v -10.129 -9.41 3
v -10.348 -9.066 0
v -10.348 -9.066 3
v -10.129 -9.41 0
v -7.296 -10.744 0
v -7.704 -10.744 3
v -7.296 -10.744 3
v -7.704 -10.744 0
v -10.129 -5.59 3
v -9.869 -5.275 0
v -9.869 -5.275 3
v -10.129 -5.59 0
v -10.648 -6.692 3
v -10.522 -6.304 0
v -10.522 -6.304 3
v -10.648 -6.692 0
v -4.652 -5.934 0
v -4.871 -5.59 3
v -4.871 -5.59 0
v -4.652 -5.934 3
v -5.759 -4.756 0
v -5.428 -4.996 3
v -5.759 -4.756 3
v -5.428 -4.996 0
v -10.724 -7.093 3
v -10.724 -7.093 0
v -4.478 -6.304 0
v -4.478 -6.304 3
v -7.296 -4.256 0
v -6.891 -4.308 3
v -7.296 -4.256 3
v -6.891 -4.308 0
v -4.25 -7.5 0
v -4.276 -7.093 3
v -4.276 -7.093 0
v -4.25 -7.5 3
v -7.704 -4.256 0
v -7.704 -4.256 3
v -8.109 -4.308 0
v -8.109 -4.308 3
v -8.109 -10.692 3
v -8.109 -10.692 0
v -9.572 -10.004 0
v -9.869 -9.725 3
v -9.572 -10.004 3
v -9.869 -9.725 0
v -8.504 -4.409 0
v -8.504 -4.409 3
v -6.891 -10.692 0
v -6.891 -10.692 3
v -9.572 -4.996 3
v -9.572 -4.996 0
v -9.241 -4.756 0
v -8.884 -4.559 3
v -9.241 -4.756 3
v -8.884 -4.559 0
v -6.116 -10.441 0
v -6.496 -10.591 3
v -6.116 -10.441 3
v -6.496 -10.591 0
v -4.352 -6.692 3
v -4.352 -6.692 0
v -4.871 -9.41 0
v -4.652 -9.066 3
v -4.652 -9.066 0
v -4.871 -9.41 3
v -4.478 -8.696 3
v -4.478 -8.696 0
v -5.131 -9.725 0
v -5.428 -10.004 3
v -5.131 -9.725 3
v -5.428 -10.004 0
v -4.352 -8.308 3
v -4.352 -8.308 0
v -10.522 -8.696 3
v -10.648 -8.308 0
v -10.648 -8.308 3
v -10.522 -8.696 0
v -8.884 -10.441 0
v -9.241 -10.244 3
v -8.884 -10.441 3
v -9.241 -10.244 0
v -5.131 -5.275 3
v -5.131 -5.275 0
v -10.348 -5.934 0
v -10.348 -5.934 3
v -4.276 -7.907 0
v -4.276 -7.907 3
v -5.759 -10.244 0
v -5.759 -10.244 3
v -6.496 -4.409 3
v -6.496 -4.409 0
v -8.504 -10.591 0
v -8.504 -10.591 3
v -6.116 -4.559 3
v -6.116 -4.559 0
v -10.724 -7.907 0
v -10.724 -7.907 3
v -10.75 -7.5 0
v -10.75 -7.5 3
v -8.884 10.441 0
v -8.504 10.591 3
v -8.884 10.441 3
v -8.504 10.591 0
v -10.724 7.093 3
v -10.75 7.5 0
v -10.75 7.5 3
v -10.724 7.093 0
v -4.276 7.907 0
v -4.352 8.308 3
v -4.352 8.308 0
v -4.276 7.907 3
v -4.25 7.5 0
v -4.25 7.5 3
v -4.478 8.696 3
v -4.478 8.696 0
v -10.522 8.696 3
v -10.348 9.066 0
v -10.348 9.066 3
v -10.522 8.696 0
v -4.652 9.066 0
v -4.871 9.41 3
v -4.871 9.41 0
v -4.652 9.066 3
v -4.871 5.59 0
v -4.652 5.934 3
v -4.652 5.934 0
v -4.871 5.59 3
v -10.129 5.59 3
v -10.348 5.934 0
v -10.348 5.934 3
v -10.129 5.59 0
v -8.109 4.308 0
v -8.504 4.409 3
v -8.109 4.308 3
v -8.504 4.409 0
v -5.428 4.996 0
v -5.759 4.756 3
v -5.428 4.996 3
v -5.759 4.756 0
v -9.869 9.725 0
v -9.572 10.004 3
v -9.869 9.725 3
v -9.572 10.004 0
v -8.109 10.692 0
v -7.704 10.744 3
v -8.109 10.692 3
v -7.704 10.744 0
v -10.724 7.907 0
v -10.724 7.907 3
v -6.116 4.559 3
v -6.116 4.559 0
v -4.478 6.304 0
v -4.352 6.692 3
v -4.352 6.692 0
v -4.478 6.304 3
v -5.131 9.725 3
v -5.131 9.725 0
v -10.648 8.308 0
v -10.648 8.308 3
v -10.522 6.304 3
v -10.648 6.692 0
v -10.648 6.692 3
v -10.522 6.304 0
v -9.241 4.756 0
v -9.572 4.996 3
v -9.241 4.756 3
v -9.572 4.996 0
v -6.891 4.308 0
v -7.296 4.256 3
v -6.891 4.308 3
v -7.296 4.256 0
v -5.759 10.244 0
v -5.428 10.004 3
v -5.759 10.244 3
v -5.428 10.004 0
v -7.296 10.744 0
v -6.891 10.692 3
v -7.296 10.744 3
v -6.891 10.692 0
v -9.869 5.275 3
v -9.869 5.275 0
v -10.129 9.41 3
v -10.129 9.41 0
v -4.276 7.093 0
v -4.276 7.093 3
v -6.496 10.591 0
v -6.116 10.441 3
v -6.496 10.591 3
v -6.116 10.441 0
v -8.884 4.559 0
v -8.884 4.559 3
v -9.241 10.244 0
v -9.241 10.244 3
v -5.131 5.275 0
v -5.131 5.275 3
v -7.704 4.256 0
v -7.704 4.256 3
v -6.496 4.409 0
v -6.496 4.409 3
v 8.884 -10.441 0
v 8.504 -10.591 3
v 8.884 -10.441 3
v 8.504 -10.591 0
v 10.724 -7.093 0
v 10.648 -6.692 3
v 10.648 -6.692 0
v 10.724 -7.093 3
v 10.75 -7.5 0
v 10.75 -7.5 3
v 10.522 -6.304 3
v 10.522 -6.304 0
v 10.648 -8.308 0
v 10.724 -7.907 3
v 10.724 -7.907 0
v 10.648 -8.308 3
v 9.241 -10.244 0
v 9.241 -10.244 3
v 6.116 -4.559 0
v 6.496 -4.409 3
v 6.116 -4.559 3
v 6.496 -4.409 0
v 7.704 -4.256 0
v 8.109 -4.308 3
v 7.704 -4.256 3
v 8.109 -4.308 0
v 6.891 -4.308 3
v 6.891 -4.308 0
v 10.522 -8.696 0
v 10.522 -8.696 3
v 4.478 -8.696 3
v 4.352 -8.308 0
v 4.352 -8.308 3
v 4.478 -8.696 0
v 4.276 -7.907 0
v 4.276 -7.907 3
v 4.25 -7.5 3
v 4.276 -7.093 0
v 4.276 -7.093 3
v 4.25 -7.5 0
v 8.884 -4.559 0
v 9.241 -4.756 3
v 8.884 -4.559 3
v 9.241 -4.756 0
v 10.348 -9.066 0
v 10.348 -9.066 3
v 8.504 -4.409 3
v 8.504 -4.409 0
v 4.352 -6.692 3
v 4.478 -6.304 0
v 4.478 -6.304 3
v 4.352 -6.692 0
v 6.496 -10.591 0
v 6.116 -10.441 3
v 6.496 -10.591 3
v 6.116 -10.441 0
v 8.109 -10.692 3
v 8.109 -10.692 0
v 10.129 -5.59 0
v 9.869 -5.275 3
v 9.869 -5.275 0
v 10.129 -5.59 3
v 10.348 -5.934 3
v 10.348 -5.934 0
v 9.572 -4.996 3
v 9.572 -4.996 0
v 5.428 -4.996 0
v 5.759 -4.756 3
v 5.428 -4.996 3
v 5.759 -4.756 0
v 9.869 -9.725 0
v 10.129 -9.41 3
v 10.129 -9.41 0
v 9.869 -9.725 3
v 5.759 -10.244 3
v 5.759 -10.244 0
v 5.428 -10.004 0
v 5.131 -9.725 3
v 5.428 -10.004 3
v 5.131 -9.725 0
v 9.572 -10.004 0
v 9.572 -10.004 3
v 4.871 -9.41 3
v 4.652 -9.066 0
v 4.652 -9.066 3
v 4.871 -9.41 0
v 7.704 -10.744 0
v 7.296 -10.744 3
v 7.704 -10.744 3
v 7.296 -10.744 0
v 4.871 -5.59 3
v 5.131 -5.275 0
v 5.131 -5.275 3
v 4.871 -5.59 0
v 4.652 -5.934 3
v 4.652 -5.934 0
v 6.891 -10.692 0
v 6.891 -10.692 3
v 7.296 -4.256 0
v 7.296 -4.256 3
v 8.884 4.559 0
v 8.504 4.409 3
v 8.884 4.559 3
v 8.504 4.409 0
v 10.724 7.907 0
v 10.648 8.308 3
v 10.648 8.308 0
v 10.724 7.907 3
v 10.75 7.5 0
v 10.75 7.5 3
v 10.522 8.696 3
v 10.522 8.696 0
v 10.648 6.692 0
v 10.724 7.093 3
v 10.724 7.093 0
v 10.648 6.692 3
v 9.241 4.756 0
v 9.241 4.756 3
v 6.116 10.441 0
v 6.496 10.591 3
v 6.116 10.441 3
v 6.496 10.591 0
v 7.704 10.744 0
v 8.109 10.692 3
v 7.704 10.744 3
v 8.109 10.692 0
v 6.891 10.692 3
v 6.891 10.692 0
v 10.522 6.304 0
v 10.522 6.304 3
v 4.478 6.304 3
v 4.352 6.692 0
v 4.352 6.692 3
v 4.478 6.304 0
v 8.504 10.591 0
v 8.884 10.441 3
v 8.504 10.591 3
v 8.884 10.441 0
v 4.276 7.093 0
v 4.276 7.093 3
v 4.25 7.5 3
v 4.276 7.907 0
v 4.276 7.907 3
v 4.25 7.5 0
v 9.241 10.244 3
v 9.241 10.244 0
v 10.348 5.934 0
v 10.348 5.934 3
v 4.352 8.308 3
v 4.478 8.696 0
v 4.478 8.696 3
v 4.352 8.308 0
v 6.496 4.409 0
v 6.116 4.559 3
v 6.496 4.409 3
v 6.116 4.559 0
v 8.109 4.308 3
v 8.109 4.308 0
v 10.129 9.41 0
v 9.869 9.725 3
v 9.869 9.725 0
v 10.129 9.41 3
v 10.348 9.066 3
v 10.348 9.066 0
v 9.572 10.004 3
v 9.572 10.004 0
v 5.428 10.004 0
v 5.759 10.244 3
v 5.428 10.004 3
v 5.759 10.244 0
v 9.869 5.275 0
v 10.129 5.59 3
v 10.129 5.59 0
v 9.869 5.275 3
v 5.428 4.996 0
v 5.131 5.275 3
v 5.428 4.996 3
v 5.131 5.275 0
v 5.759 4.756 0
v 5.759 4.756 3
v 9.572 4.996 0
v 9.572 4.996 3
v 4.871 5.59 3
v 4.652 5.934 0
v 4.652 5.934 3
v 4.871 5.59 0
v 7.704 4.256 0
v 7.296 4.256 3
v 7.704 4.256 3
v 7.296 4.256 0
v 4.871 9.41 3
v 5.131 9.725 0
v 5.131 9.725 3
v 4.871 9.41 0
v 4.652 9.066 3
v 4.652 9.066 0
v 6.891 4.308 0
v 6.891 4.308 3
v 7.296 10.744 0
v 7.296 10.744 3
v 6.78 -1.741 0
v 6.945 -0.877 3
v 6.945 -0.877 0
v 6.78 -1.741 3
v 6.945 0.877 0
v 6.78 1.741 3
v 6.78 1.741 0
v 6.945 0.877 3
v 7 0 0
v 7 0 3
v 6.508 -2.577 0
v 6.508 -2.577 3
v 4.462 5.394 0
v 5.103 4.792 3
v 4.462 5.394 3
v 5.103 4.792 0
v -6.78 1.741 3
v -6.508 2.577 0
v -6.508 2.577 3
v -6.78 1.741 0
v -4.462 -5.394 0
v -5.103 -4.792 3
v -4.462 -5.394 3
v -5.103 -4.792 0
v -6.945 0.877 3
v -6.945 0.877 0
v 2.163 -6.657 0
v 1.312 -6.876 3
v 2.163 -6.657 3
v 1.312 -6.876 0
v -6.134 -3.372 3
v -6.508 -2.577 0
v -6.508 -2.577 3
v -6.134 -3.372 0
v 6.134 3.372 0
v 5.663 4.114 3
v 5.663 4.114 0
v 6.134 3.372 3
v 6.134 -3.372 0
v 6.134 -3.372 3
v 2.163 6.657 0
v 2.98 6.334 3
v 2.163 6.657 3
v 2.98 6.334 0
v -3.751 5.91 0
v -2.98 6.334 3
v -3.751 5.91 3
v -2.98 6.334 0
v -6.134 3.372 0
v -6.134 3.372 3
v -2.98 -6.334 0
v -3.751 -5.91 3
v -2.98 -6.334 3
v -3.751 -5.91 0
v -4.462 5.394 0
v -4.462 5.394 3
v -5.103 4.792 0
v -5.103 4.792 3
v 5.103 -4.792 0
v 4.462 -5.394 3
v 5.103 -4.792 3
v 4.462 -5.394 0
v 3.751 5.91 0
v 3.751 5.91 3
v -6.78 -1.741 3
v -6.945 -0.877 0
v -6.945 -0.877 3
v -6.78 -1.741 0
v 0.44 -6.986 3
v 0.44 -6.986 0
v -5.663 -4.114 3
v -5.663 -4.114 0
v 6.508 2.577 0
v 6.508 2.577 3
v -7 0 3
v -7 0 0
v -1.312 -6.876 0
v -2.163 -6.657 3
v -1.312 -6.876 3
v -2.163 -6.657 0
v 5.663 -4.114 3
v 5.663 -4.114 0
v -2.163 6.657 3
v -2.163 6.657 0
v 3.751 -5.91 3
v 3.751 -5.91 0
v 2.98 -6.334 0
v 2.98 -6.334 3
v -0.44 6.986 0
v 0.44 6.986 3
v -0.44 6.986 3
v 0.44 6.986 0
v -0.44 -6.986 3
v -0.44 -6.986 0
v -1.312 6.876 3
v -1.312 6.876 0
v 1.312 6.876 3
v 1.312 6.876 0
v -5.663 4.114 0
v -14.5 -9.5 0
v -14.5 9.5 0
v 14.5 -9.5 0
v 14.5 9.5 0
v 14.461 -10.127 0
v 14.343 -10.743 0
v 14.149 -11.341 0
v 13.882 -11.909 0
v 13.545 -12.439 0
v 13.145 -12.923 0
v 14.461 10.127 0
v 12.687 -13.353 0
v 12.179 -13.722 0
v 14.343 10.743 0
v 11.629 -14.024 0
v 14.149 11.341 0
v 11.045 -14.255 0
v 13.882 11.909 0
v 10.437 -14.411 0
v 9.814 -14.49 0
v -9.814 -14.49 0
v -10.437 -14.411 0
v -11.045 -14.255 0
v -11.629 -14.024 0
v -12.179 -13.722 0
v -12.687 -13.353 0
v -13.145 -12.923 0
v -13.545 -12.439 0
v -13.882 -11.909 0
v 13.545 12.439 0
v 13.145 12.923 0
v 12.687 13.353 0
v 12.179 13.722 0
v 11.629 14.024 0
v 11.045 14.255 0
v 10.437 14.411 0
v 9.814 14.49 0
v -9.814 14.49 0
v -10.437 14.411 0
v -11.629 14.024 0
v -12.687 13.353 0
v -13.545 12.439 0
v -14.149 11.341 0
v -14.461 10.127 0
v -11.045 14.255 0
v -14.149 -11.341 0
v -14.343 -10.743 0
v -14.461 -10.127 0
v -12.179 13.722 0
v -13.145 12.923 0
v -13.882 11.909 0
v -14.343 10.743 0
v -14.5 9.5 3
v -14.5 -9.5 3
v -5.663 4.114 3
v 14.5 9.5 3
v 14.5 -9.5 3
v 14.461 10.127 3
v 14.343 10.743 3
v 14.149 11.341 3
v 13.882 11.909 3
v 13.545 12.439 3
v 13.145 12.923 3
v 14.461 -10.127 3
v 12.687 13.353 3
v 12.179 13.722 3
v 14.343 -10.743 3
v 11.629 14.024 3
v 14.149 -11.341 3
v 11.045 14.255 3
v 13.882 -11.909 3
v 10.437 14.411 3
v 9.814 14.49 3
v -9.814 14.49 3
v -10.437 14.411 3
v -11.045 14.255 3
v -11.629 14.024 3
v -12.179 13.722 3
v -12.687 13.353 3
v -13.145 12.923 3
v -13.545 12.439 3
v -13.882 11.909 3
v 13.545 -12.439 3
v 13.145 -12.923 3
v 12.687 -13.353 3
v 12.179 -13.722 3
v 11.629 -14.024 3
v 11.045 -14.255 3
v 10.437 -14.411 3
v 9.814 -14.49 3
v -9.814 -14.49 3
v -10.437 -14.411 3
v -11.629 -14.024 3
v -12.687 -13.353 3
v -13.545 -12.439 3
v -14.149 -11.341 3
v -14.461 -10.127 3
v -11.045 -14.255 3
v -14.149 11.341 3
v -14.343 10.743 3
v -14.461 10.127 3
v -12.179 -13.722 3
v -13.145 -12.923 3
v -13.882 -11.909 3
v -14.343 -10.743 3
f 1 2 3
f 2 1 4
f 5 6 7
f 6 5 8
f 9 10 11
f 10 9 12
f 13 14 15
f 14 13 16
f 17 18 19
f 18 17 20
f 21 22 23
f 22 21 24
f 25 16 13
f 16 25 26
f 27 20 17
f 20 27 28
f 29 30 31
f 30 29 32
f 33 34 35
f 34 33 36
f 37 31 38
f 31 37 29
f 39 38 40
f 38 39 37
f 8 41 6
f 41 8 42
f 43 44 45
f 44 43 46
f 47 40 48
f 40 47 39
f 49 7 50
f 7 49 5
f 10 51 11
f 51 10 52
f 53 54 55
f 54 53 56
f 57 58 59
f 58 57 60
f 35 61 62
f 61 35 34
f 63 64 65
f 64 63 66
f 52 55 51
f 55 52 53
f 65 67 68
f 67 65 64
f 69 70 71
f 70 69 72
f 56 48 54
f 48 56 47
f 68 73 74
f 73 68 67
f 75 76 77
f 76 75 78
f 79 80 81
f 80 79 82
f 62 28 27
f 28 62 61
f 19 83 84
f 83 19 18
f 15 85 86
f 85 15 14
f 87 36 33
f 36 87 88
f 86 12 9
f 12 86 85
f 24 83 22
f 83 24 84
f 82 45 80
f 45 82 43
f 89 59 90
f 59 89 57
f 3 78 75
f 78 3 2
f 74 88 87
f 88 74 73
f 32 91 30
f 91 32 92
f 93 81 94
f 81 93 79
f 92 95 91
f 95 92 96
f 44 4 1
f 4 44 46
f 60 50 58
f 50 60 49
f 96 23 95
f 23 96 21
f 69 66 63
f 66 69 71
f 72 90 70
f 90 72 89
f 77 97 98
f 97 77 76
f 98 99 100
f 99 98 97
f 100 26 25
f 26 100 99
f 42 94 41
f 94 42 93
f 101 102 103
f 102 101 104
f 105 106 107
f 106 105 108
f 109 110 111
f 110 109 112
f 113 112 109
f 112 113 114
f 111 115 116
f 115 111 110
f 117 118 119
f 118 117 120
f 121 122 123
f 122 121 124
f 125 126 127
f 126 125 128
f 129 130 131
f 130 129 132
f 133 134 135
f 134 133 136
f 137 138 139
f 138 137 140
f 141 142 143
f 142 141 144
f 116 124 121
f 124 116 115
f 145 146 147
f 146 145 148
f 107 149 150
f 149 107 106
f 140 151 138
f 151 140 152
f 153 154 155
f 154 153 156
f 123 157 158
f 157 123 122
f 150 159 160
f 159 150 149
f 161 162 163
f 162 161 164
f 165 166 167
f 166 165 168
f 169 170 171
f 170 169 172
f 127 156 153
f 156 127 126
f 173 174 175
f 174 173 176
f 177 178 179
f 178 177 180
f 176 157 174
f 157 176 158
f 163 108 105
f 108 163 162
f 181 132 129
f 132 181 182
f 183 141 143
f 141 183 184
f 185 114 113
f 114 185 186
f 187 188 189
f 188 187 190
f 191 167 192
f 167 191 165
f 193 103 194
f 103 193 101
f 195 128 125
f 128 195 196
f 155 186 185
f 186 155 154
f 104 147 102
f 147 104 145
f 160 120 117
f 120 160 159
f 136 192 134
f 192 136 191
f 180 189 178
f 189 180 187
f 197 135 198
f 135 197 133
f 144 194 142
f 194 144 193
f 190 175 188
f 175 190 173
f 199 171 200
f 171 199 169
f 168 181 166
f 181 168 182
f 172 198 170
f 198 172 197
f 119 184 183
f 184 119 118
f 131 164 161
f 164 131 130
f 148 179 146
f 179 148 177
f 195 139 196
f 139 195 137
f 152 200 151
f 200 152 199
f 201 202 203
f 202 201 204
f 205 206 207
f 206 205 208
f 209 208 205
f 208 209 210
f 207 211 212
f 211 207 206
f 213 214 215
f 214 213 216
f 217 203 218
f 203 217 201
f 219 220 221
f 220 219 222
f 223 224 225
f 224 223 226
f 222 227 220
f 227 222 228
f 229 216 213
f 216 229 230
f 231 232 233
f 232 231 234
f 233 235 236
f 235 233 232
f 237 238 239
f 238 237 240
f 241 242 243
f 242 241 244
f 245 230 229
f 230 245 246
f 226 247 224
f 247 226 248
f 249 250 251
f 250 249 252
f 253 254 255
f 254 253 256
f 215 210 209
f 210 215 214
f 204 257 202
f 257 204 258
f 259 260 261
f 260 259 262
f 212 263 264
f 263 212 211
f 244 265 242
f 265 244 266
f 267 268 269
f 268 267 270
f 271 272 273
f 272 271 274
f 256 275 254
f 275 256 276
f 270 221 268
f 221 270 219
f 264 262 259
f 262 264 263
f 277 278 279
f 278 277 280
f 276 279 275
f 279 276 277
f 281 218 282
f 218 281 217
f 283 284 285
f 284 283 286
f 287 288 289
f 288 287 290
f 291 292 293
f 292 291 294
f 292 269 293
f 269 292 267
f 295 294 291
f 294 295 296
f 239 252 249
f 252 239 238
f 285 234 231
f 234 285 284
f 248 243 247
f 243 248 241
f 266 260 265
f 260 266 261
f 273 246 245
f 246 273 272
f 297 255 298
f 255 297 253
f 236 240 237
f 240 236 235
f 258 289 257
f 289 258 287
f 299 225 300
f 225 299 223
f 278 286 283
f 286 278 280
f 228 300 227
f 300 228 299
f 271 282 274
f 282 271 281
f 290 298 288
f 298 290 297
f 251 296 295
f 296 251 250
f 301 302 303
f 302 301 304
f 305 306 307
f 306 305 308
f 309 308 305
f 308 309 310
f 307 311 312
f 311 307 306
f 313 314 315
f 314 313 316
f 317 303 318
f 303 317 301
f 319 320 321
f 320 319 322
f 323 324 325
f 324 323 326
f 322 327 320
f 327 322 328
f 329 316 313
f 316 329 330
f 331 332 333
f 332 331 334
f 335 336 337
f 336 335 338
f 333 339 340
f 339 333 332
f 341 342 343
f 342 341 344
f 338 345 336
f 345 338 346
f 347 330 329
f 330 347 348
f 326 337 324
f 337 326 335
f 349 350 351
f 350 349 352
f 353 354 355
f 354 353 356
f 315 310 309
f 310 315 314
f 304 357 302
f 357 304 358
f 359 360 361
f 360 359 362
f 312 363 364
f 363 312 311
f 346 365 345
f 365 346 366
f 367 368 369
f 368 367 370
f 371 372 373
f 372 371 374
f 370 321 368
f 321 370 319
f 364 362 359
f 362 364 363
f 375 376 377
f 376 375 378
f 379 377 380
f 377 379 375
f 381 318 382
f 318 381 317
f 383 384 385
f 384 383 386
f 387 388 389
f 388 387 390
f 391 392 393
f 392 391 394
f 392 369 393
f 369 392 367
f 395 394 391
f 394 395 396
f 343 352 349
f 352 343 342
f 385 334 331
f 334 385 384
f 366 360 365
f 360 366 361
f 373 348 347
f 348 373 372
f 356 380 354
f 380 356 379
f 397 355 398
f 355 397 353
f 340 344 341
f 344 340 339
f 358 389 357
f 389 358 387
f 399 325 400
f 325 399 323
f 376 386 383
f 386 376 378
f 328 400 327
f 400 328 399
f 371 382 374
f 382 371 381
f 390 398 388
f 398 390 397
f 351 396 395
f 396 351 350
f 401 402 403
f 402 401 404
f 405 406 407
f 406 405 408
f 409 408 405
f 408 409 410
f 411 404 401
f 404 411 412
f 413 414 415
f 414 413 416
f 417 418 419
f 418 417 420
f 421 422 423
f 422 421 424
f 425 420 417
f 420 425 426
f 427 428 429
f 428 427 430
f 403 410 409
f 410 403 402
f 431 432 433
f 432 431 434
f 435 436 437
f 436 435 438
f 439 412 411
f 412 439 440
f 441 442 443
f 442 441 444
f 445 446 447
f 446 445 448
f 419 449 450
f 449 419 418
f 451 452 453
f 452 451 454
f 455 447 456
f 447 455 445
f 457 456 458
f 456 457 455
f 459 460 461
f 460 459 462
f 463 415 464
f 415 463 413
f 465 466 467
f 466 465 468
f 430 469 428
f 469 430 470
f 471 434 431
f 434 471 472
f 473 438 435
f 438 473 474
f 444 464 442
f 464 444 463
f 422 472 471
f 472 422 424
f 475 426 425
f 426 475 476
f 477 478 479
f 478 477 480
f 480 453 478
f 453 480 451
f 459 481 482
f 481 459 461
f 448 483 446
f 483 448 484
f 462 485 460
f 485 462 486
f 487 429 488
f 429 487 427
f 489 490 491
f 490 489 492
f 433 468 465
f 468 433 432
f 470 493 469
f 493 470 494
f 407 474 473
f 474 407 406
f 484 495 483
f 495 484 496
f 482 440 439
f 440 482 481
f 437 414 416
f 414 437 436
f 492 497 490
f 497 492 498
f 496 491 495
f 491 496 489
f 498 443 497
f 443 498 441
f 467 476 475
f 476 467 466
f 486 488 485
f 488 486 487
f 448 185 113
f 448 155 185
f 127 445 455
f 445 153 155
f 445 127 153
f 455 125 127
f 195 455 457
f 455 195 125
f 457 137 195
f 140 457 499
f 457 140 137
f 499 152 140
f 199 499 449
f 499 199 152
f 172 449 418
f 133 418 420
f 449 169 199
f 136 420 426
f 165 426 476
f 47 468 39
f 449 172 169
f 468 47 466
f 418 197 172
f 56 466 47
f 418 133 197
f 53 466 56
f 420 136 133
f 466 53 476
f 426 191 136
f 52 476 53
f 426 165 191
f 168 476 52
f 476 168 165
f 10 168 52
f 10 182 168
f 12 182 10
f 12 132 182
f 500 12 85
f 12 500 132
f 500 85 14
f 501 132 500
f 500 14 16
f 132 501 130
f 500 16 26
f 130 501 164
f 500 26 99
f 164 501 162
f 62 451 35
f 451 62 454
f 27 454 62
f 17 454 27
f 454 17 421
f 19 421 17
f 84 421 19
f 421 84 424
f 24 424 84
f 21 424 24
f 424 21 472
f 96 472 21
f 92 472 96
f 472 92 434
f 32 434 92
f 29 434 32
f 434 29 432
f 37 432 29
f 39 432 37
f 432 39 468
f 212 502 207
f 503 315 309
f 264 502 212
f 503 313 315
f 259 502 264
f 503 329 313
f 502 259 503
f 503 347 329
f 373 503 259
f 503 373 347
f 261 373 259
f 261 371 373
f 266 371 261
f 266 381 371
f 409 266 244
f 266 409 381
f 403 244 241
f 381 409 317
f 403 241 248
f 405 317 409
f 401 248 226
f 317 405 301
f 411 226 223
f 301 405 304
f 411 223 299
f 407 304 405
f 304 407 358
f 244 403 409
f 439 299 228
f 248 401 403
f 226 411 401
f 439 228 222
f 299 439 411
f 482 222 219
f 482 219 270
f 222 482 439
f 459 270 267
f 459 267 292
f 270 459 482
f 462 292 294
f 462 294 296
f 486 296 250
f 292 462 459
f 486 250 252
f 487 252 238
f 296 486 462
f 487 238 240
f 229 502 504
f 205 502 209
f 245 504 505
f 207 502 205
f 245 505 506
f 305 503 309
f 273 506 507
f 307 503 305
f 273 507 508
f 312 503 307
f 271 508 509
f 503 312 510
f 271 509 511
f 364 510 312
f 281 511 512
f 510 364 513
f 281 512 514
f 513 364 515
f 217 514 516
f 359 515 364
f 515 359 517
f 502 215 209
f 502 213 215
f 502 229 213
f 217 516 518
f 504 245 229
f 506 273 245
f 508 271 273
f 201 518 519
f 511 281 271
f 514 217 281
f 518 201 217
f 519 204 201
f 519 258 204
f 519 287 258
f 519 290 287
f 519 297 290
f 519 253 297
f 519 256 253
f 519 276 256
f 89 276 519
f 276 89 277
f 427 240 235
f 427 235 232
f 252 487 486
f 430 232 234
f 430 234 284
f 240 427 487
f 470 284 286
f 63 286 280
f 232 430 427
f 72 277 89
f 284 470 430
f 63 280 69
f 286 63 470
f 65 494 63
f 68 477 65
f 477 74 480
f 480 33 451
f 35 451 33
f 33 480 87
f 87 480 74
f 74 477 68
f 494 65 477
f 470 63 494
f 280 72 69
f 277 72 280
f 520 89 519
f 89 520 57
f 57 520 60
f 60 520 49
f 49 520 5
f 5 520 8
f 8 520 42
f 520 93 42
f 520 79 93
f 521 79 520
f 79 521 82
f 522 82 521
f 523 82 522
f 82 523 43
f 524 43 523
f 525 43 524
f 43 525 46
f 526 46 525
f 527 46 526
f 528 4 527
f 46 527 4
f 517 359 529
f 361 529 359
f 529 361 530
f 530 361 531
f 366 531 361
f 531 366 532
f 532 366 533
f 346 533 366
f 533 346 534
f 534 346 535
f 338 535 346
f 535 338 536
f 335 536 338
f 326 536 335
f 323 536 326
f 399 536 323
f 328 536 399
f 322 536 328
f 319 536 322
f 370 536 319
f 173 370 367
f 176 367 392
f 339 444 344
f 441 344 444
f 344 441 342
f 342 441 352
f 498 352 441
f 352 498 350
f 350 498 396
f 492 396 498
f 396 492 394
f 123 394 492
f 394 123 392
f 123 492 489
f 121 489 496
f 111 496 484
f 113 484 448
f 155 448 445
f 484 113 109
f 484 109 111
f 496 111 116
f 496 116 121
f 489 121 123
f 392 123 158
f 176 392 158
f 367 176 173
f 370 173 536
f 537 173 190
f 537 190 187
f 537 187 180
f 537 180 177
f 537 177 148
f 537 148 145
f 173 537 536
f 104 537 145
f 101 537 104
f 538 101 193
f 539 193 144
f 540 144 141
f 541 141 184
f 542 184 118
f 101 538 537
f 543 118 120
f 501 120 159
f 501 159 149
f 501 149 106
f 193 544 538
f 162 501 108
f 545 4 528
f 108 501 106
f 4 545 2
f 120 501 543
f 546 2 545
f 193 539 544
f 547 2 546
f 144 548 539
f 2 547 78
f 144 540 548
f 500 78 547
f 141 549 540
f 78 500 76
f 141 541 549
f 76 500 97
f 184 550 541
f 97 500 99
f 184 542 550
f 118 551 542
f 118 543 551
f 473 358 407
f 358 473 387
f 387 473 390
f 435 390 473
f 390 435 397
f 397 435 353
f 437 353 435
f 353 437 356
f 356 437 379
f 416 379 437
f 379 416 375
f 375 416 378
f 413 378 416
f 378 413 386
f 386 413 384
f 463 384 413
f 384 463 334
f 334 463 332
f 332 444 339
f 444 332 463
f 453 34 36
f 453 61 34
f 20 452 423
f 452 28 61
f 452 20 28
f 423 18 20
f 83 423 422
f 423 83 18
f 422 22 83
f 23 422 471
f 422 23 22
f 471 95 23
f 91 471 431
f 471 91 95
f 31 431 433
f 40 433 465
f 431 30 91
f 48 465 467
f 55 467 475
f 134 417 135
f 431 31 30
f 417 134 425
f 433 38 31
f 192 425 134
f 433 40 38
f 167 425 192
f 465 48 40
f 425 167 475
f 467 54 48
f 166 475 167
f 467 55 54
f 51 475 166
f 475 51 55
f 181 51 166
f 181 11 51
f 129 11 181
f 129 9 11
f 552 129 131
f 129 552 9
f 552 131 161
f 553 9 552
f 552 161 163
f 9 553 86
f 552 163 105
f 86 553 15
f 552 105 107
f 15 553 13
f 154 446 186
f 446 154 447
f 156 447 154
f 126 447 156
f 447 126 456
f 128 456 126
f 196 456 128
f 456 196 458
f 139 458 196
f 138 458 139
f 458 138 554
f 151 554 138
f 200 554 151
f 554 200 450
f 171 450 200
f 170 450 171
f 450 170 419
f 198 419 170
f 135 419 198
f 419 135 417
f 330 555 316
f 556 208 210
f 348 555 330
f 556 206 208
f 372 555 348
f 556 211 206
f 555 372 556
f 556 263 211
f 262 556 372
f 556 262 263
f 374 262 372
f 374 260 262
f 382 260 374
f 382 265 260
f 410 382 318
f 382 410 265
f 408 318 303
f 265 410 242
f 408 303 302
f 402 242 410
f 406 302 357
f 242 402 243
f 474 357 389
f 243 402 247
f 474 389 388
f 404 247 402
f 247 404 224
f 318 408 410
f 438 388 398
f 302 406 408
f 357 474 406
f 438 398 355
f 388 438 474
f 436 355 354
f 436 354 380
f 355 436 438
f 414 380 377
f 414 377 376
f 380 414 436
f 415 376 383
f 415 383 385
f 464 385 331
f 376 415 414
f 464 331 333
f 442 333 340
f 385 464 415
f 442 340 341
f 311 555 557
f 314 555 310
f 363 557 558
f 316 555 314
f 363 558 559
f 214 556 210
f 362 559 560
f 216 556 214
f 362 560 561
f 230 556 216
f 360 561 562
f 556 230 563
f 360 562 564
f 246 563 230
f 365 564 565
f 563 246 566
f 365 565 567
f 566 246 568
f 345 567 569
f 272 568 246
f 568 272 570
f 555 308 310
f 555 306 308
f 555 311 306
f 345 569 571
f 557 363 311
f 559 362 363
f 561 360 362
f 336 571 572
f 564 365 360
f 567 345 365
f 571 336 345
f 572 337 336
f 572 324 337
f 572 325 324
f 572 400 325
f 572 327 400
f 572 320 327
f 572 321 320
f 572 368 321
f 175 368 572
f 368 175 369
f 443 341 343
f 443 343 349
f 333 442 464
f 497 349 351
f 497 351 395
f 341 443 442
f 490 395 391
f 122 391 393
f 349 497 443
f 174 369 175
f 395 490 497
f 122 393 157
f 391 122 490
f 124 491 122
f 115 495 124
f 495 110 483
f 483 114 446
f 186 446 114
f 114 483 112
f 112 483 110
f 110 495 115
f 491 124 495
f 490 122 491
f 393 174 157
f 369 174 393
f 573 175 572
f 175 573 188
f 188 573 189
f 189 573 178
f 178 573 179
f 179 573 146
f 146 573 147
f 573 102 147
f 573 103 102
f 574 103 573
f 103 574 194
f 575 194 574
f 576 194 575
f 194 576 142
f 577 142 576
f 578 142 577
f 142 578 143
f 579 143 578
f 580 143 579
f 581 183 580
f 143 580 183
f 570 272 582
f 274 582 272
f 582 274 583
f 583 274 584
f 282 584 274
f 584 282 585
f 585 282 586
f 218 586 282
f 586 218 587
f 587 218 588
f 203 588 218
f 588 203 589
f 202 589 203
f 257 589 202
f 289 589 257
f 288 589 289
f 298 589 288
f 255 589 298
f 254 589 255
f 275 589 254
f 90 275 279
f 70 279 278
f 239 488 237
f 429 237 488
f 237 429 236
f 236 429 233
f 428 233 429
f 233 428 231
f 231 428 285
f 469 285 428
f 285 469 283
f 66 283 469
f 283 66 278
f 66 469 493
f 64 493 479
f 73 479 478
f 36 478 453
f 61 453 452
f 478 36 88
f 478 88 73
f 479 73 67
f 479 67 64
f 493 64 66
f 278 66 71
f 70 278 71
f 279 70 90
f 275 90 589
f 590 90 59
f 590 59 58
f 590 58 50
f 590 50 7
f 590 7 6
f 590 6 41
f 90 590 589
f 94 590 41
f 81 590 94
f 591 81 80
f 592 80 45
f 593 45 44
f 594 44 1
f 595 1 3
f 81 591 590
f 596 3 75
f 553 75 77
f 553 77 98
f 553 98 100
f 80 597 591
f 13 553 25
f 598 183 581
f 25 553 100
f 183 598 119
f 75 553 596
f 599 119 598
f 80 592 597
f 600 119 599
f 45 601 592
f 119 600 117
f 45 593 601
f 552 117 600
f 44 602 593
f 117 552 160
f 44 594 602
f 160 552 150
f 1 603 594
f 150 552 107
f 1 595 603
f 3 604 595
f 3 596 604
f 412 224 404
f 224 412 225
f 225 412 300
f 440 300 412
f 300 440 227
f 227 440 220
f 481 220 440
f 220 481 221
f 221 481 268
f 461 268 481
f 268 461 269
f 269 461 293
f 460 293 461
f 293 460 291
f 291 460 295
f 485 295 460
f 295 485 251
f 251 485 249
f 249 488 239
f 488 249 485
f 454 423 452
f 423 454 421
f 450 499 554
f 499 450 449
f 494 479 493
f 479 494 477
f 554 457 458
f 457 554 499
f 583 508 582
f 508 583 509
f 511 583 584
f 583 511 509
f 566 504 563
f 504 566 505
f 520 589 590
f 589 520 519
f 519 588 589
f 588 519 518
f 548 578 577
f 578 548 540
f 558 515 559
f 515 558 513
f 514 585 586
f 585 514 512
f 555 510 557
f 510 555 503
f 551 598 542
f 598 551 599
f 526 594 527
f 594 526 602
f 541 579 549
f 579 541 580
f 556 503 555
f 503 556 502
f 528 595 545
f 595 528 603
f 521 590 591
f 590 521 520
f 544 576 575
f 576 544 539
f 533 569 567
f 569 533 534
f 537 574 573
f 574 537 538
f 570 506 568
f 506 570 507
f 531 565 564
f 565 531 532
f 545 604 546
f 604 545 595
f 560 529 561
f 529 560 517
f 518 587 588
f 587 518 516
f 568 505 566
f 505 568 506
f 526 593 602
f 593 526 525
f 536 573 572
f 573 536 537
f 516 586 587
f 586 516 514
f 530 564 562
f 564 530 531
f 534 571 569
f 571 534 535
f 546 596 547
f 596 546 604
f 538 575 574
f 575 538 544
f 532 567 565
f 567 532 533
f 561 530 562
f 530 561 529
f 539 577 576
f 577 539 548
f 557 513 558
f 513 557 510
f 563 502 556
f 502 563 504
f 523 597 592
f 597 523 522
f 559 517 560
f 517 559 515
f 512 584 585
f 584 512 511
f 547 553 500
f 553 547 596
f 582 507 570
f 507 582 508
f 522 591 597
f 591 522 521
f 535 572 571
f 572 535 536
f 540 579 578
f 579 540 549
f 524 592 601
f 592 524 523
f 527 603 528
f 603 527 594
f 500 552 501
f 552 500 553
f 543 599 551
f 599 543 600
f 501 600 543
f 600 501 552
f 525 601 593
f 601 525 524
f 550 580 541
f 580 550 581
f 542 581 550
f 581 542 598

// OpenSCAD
$fn = 50;


difference() {
	union() {
		hull() {
			translate(v = [-9.5000000000, 9.5000000000, 0]) {
				cylinder(h = 3, r = 5);
			}
			translate(v = [9.5000000000, 9.5000000000, 0]) {
				cylinder(h = 3, r = 5);
			}
			translate(v = [-9.5000000000, -9.5000000000, 0]) {
				cylinder(h = 3, r = 5);
			}
			translate(v = [9.5000000000, -9.5000000000, 0]) {
				cylinder(h = 3, r = 5);
			}
		}
	}
	union() {
		#translate(v = [-7.5000000000, -7.5000000000, -100.0000000000]) {
			cylinder(h = 200, r = 3.2500000000);
		}
		#translate(v = [-7.5000000000, 7.5000000000, -100.0000000000]) {
			cylinder(h = 200, r = 3.2500000000);
		}
		#translate(v = [7.5000000000, -7.5000000000, -100.0000000000]) {
			cylinder(h = 200, r = 3.2500000000);
		}
		#translate(v = [7.5000000000, 7.5000000000, -100.0000000000]) {
			cylinder(h = 200, r = 3.2500000000);
		}
		#cylinder(h = 3, r = 7.0000000000);
	}
}
